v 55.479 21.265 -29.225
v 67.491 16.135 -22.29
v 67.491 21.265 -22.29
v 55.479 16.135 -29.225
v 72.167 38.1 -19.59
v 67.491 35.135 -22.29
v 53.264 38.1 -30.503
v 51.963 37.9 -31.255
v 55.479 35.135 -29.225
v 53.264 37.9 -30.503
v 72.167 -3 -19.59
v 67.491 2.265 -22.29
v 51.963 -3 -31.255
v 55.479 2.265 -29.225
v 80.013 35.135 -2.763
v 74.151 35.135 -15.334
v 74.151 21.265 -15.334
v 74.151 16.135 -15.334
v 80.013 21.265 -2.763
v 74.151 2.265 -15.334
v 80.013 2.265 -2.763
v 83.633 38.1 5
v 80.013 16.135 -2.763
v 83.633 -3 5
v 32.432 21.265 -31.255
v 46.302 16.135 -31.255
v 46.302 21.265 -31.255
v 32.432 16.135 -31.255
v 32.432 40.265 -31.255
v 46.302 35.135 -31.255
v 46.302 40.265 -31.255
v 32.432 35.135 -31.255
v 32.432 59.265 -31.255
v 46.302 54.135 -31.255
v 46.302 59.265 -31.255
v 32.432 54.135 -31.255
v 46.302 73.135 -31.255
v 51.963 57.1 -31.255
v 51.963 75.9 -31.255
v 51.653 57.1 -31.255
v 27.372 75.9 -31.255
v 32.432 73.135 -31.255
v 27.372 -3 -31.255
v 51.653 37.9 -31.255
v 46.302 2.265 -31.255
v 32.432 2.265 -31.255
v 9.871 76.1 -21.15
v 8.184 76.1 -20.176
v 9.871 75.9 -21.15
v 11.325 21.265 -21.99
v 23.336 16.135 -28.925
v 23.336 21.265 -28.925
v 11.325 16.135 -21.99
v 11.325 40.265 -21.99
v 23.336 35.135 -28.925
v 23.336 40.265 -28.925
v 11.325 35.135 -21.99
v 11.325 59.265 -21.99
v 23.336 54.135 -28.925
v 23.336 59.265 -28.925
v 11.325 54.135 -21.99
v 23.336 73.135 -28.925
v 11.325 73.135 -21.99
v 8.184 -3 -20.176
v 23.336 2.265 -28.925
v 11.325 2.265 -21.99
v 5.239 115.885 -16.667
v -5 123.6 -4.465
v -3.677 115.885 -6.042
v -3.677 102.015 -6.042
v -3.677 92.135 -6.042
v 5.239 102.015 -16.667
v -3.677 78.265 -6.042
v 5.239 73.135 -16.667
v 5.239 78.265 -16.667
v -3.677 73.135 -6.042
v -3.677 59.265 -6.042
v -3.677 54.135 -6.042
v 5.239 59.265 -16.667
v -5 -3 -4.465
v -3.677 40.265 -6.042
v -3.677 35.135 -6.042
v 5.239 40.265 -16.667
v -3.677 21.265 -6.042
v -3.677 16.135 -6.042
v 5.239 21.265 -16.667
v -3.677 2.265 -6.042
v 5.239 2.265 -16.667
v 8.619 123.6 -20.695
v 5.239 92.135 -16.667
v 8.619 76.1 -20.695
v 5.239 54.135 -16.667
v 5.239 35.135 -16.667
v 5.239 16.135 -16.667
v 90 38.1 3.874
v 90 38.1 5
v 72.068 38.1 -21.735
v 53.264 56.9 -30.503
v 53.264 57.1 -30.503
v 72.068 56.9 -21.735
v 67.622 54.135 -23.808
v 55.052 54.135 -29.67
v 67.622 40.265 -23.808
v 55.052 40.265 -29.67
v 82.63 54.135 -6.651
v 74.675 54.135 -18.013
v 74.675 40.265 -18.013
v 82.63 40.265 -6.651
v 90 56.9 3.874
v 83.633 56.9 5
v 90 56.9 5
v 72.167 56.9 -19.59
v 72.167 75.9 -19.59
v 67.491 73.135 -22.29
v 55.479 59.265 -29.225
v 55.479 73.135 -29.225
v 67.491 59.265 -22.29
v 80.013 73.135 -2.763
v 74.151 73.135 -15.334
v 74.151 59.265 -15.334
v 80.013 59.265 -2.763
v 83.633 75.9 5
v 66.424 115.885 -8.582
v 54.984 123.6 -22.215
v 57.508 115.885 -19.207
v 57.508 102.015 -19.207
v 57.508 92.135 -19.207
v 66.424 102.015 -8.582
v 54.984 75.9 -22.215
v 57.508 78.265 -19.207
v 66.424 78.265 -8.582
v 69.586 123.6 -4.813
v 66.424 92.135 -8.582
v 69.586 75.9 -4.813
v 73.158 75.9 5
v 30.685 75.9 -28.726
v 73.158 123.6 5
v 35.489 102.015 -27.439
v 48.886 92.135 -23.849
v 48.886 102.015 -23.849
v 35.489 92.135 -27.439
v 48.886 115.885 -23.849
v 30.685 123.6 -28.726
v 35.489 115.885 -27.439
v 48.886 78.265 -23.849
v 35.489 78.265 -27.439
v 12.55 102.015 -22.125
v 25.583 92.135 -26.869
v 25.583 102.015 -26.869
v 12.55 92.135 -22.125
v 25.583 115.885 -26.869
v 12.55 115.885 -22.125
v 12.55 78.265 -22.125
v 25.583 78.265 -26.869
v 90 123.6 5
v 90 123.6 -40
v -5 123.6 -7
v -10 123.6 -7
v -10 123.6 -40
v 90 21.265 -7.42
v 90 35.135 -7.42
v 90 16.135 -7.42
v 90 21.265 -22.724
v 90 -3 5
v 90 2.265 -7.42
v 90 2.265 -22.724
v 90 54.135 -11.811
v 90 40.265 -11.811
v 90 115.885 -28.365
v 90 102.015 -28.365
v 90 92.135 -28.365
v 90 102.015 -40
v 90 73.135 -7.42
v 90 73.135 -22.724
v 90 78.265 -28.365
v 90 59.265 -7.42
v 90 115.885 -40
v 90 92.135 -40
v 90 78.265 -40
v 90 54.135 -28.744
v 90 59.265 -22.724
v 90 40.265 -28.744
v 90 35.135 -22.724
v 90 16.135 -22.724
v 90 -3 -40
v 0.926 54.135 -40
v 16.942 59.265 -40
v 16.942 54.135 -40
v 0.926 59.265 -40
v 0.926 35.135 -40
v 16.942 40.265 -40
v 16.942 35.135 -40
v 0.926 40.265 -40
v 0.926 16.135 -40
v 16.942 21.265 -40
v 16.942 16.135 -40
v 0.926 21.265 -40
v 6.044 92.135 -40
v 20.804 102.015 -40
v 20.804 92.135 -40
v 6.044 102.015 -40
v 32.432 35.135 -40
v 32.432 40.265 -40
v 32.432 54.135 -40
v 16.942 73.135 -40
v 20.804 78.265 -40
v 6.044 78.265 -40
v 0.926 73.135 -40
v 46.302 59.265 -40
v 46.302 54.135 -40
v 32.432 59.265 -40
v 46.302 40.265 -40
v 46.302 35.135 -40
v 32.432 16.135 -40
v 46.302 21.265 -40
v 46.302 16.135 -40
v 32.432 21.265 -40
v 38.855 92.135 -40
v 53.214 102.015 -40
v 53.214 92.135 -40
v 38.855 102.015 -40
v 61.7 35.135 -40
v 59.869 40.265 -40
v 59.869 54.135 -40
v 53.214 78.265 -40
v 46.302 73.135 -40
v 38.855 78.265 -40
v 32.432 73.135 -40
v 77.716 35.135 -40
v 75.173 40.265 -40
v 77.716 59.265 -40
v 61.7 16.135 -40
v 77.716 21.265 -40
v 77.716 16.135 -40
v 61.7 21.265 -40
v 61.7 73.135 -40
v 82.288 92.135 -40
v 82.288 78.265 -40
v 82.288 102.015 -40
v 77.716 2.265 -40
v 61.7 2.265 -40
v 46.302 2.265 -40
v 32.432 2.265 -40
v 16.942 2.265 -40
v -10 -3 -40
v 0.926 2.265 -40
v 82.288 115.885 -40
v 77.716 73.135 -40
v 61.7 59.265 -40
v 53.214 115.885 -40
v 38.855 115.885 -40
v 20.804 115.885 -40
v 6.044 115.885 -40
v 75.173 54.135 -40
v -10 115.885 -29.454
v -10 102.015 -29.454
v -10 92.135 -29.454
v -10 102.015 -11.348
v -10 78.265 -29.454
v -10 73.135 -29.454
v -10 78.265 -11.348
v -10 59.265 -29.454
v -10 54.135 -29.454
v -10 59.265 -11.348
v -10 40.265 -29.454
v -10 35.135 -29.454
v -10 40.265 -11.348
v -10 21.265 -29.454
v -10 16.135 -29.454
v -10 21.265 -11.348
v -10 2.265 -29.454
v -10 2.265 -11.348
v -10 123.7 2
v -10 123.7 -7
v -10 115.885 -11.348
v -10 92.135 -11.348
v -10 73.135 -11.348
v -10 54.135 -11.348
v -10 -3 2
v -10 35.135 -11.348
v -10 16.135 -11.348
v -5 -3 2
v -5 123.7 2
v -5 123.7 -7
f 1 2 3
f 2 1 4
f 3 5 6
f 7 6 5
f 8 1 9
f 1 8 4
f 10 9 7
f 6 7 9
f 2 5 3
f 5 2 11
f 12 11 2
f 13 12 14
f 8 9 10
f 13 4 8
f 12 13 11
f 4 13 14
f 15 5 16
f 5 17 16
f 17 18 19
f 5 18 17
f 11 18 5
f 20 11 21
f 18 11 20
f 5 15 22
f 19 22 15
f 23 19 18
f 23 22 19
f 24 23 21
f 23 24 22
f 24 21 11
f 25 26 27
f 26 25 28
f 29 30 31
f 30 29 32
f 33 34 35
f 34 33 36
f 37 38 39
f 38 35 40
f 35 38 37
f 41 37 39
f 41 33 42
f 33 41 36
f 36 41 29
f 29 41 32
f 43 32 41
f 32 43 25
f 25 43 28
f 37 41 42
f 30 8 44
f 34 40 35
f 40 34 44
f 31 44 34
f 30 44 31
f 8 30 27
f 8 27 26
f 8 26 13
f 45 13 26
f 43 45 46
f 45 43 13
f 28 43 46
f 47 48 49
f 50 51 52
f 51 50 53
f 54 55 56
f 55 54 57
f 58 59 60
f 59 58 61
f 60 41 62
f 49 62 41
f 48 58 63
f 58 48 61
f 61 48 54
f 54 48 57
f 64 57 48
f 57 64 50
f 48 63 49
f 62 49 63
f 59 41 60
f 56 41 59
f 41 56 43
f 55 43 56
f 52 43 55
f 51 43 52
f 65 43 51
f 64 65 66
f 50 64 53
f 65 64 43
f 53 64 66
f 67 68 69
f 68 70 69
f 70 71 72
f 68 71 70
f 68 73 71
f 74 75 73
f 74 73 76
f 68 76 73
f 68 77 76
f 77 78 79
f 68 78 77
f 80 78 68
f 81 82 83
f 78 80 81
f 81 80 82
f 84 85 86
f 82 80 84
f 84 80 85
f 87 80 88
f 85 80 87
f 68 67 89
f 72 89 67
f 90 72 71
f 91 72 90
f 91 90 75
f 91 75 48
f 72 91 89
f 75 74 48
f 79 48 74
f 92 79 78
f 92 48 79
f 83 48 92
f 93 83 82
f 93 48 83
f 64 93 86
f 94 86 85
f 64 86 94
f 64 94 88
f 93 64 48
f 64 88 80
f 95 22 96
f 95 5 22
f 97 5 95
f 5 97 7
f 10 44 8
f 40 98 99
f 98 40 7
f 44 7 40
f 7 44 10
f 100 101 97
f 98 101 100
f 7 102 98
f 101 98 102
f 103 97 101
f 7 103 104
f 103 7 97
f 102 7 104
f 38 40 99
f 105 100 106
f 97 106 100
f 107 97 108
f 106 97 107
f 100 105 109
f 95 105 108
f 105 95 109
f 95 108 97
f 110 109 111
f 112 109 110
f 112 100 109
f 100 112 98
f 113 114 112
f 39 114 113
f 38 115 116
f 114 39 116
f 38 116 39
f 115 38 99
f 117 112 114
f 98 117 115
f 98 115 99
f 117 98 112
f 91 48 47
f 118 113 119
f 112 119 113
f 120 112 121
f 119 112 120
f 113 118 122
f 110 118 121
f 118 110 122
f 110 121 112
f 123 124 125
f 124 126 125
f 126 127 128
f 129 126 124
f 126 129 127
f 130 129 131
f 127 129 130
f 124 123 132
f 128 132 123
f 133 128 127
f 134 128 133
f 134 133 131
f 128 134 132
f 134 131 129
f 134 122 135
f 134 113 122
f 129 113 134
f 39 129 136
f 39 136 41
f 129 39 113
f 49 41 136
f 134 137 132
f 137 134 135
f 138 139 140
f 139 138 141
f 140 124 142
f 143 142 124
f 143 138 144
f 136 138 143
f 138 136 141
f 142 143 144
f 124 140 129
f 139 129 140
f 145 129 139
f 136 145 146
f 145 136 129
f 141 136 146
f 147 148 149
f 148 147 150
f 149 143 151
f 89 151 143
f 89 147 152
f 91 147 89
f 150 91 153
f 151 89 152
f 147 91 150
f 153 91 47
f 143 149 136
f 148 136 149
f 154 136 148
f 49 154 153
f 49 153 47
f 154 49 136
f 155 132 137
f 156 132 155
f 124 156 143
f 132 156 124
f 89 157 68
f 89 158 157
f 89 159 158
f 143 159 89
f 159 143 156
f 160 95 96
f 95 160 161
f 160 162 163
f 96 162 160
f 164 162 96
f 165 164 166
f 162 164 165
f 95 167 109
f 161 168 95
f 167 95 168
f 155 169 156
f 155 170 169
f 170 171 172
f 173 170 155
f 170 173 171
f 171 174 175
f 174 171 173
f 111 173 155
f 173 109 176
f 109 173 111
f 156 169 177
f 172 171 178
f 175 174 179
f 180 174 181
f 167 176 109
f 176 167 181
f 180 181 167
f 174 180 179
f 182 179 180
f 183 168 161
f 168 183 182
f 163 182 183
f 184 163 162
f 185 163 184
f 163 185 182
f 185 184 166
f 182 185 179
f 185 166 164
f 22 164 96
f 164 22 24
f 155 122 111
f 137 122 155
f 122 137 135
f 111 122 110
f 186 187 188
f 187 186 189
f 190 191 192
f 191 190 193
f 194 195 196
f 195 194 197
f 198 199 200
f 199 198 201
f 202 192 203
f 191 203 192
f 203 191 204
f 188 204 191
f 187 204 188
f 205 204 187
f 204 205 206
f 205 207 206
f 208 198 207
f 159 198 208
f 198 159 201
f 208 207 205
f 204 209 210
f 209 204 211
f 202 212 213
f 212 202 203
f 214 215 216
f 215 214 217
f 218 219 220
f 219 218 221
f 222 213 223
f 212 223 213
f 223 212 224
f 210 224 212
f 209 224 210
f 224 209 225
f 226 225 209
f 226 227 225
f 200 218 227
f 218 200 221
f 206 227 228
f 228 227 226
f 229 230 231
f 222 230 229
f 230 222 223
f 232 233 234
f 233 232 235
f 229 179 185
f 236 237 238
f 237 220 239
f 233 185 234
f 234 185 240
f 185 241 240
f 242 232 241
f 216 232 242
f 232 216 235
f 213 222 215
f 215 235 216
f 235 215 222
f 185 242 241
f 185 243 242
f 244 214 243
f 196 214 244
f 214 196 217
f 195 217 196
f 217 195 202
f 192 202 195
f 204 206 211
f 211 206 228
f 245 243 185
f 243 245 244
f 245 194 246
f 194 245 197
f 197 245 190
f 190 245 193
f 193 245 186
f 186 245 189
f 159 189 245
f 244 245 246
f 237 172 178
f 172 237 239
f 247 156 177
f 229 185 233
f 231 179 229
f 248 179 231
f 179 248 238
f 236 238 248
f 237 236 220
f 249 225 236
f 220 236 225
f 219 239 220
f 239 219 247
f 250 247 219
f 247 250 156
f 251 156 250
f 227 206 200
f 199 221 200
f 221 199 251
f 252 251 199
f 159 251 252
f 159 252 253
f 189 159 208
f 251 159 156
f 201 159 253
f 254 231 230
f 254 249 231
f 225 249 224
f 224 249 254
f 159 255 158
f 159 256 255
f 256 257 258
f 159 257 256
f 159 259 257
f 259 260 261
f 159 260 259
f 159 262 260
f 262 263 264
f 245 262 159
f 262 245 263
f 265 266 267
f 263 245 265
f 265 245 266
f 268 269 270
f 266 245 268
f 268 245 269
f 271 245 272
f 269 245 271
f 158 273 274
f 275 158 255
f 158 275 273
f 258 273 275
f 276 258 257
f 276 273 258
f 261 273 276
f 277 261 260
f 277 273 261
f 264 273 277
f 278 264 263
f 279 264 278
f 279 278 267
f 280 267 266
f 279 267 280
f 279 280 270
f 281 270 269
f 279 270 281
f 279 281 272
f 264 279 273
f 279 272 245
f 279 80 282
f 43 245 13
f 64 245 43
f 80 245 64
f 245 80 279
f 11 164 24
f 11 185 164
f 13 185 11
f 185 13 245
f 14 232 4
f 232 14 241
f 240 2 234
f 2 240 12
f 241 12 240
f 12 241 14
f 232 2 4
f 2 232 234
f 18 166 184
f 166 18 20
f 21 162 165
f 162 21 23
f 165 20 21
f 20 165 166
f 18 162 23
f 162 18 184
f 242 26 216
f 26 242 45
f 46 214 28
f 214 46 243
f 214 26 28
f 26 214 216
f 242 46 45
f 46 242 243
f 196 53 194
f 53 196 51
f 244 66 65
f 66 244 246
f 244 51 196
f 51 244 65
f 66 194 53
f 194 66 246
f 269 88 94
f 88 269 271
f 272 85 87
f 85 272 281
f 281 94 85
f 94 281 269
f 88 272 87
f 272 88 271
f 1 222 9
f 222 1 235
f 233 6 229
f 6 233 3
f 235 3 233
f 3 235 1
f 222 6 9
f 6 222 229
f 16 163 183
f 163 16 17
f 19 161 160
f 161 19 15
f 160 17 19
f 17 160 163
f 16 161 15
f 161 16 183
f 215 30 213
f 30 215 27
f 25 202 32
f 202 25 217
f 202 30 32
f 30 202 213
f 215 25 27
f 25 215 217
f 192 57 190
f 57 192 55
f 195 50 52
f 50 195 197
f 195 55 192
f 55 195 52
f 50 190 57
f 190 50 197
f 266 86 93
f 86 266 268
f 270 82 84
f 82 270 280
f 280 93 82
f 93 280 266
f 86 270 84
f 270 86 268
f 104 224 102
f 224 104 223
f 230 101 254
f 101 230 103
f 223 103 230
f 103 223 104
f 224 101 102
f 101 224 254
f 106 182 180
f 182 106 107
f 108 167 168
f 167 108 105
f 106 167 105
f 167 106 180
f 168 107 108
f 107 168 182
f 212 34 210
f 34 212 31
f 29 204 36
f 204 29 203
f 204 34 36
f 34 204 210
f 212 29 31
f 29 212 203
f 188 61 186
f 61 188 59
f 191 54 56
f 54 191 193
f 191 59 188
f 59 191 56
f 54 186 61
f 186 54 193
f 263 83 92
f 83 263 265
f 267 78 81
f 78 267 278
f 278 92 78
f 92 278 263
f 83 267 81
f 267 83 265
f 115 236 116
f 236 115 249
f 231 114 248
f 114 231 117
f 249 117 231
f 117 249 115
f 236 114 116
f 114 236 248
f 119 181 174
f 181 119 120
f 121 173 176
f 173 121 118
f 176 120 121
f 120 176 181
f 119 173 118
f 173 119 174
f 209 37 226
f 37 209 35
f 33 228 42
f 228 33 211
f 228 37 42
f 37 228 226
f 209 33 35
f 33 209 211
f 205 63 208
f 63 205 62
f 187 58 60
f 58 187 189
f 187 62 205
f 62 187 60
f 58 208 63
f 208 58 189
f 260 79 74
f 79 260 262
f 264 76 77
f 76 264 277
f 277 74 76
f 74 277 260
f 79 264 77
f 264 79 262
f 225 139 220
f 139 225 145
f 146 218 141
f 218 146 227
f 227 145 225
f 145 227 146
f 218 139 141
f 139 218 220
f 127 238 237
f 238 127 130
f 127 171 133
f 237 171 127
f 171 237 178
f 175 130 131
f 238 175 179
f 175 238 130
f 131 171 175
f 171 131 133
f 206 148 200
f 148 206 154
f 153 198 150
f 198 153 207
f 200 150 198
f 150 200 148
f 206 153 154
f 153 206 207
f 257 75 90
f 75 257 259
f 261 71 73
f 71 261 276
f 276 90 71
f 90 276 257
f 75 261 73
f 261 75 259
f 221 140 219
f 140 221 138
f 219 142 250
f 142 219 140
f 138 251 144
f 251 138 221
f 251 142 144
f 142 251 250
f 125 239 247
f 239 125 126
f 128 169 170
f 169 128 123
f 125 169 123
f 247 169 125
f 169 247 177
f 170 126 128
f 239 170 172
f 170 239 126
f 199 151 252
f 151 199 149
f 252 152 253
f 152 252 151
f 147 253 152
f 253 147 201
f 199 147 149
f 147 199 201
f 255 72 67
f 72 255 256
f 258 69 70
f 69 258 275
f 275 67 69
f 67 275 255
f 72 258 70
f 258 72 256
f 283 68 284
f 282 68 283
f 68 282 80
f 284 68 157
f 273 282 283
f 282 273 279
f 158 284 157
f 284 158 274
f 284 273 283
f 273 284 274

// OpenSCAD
KEY_WIDE = 18.4;
KW = KEY_WIDE;
KEY_NARROW = 12.7;
KEY_HEIGHT = 7.4;

SINGLE = 19;
SINGLE_AND_HALF = SINGLE * 1.5;

module key_base(type, width, is_simplified=true) {
    if (type == 0) {
        resize([KW, KW * width / SINGLE, KEY_HEIGHT])
        {
            KEYCAP_OFFSET = -1;
            if (is_simplified) {
                WN_OFFSET = (KEY_WIDE - KEY_NARROW) / 2;
                polyhedron(
                points=[
                    [0, 0, 0],
                    [KEY_WIDE, 0, 0],
                    [KEY_WIDE, KEY_WIDE, 0],
                    [0, KEY_WIDE, 0],
                    [WN_OFFSET, WN_OFFSET, KEY_HEIGHT],
                    [WN_OFFSET + KEY_NARROW, WN_OFFSET, KEY_HEIGHT],
                    [WN_OFFSET + KEY_NARROW, WN_OFFSET + KEY_NARROW, KEY_HEIGHT],
                    [WN_OFFSET, WN_OFFSET + KEY_NARROW, KEY_HEIGHT],
                ],
                faces=[
                    [0, 1, 2],
                    [2, 3, 0],
                    [4, 5, 6],
                    [6, 7, 4],
                    [0, 1, 4],
                    [4, 5, 1],
                    [1, 2, 5],
                    [5, 6, 2],
                    [2, 3, 6],
                    [6, 7, 3],
                    [3, 0, 7],
                    [7, 4, 0]
                ]
            );
            }
            else {
                translate([KW / 2, KW / 2, KEYCAP_OFFSET]) {
                    import("./keycaps/mx_dsa.stl");
                }
            }
        }
    } else if (type == 1) {
        CASE_EXTRUSION_DEPTH = 200;
        CASE_OFFSET = 6.7;
        translate([-KW, -0.1, -CASE_EXTRUSION_DEPTH - CASE_OFFSET]) {
            cube([4 * KW, width + 0.2, CASE_EXTRUSION_DEPTH]);
        }
    } else if (type == 2){
        translate([0, (width - SINGLE) / 2, 0]) {
            HOLE_WIDTH = 13.97 - 0.1;
            HOLE_OFFSET = (KW - HOLE_WIDTH) / 2;
            HOLE_HEIGHT = 60;
            translate([HOLE_OFFSET, HOLE_OFFSET, -HOLE_HEIGHT + 1]) {
                cube([HOLE_WIDTH, HOLE_WIDTH, HOLE_HEIGHT]);
            }
        }
    }
}


module key(angle, type, width) {
    rotate(angle, [0, 1, 0]) key_base(type, width);
}


module column(type, angles, offsets_x, offsets_z, width=SINGLE, with_last=true) {
    key(angles[0], type, width);
    translate([SINGLE * cos(angles[0]) + offsets_x[0], 0, -SINGLE * sin(angles[0]) + offsets_z[0]]) {
        key(angles[1], type, width);
        translate([SINGLE * cos(angles[1]) + offsets_x[1], 0, -SINGLE * sin(angles[1]) + offsets_z[1]]) {
            key(angles[2], type, width);
            translate([SINGLE * cos(angles[2]) + offsets_x[2], 0, -SINGLE * sin(angles[2]) + offsets_z[2]]) {
                key(angles[3], type, width);
                if (with_last) {
                    translate([SINGLE * cos(angles[3]) + offsets_x[3], 0, -SINGLE * sin(angles[3]) + offsets_z[3]]) {
                        key(angles[4], type, width);
                    }
                }
            }
        }
    }
}


angles = [
    [50, 30, 0, -30, -65],
    [50, 30, 0, -30, -65],
    [50, 30, 0, -25, -55],
    [50, 30, 0, -30, -65],
    [50, 20, -15, -50, -70],
    [50, 20, -15, -50, -70]
];
offsets_x = [0.5, 1, 1, 0.5];
offsets_z = [-0.5, 0, 0, 0.5];


module keyboard(with_keys=false) {
    translate([0, 0, 0]) {
        translate([-10, -3, -7]) cube([5, 126.7, 9]);
        difference() {
            intersection() {
                translate([-10, -3, -40]) cube([100, 130, 45]);
                union() {
                    for (i = [0:4]) {
                        translate([0, SINGLE * i, 0]) column(1, angles[i], offsets_x, offsets_z);
                    }
                    translate([0, SINGLE * 5, 0]) column(1, angles[5], offsets_x, offsets_z, SINGLE_AND_HALF);
                    translate([0, -3, 0]) column(1, angles[0], offsets_x, offsets_z);
                }
            }
            union() {
                for (i = [0:3]) {
                    translate([0, SINGLE * i, 0]) column(2, angles[i], offsets_x, offsets_z);
                }
                translate([0, SINGLE * 4, 0]) column(2, angles[4], offsets_x, offsets_z, SINGLE, false);
                translate([0, SINGLE * 5, 0]) column(2, angles[5], offsets_x, offsets_z, SINGLE_AND_HALF, false);
            }
        }

        if (with_keys) {
            for (i = [0:3]) {
                translate([0, SINGLE * i, 0]) column(0, angles[i], offsets_x, offsets_z);
            }
            translate([0, SINGLE * 4, 0]) column(0, angles[4], offsets_x, offsets_z, SINGLE, false);
            translate([0, SINGLE * 5, 0]) column(0, angles[5], offsets_x, offsets_z, SINGLE_AND_HALF, false);
        }
    }
}


keyboard(false);
